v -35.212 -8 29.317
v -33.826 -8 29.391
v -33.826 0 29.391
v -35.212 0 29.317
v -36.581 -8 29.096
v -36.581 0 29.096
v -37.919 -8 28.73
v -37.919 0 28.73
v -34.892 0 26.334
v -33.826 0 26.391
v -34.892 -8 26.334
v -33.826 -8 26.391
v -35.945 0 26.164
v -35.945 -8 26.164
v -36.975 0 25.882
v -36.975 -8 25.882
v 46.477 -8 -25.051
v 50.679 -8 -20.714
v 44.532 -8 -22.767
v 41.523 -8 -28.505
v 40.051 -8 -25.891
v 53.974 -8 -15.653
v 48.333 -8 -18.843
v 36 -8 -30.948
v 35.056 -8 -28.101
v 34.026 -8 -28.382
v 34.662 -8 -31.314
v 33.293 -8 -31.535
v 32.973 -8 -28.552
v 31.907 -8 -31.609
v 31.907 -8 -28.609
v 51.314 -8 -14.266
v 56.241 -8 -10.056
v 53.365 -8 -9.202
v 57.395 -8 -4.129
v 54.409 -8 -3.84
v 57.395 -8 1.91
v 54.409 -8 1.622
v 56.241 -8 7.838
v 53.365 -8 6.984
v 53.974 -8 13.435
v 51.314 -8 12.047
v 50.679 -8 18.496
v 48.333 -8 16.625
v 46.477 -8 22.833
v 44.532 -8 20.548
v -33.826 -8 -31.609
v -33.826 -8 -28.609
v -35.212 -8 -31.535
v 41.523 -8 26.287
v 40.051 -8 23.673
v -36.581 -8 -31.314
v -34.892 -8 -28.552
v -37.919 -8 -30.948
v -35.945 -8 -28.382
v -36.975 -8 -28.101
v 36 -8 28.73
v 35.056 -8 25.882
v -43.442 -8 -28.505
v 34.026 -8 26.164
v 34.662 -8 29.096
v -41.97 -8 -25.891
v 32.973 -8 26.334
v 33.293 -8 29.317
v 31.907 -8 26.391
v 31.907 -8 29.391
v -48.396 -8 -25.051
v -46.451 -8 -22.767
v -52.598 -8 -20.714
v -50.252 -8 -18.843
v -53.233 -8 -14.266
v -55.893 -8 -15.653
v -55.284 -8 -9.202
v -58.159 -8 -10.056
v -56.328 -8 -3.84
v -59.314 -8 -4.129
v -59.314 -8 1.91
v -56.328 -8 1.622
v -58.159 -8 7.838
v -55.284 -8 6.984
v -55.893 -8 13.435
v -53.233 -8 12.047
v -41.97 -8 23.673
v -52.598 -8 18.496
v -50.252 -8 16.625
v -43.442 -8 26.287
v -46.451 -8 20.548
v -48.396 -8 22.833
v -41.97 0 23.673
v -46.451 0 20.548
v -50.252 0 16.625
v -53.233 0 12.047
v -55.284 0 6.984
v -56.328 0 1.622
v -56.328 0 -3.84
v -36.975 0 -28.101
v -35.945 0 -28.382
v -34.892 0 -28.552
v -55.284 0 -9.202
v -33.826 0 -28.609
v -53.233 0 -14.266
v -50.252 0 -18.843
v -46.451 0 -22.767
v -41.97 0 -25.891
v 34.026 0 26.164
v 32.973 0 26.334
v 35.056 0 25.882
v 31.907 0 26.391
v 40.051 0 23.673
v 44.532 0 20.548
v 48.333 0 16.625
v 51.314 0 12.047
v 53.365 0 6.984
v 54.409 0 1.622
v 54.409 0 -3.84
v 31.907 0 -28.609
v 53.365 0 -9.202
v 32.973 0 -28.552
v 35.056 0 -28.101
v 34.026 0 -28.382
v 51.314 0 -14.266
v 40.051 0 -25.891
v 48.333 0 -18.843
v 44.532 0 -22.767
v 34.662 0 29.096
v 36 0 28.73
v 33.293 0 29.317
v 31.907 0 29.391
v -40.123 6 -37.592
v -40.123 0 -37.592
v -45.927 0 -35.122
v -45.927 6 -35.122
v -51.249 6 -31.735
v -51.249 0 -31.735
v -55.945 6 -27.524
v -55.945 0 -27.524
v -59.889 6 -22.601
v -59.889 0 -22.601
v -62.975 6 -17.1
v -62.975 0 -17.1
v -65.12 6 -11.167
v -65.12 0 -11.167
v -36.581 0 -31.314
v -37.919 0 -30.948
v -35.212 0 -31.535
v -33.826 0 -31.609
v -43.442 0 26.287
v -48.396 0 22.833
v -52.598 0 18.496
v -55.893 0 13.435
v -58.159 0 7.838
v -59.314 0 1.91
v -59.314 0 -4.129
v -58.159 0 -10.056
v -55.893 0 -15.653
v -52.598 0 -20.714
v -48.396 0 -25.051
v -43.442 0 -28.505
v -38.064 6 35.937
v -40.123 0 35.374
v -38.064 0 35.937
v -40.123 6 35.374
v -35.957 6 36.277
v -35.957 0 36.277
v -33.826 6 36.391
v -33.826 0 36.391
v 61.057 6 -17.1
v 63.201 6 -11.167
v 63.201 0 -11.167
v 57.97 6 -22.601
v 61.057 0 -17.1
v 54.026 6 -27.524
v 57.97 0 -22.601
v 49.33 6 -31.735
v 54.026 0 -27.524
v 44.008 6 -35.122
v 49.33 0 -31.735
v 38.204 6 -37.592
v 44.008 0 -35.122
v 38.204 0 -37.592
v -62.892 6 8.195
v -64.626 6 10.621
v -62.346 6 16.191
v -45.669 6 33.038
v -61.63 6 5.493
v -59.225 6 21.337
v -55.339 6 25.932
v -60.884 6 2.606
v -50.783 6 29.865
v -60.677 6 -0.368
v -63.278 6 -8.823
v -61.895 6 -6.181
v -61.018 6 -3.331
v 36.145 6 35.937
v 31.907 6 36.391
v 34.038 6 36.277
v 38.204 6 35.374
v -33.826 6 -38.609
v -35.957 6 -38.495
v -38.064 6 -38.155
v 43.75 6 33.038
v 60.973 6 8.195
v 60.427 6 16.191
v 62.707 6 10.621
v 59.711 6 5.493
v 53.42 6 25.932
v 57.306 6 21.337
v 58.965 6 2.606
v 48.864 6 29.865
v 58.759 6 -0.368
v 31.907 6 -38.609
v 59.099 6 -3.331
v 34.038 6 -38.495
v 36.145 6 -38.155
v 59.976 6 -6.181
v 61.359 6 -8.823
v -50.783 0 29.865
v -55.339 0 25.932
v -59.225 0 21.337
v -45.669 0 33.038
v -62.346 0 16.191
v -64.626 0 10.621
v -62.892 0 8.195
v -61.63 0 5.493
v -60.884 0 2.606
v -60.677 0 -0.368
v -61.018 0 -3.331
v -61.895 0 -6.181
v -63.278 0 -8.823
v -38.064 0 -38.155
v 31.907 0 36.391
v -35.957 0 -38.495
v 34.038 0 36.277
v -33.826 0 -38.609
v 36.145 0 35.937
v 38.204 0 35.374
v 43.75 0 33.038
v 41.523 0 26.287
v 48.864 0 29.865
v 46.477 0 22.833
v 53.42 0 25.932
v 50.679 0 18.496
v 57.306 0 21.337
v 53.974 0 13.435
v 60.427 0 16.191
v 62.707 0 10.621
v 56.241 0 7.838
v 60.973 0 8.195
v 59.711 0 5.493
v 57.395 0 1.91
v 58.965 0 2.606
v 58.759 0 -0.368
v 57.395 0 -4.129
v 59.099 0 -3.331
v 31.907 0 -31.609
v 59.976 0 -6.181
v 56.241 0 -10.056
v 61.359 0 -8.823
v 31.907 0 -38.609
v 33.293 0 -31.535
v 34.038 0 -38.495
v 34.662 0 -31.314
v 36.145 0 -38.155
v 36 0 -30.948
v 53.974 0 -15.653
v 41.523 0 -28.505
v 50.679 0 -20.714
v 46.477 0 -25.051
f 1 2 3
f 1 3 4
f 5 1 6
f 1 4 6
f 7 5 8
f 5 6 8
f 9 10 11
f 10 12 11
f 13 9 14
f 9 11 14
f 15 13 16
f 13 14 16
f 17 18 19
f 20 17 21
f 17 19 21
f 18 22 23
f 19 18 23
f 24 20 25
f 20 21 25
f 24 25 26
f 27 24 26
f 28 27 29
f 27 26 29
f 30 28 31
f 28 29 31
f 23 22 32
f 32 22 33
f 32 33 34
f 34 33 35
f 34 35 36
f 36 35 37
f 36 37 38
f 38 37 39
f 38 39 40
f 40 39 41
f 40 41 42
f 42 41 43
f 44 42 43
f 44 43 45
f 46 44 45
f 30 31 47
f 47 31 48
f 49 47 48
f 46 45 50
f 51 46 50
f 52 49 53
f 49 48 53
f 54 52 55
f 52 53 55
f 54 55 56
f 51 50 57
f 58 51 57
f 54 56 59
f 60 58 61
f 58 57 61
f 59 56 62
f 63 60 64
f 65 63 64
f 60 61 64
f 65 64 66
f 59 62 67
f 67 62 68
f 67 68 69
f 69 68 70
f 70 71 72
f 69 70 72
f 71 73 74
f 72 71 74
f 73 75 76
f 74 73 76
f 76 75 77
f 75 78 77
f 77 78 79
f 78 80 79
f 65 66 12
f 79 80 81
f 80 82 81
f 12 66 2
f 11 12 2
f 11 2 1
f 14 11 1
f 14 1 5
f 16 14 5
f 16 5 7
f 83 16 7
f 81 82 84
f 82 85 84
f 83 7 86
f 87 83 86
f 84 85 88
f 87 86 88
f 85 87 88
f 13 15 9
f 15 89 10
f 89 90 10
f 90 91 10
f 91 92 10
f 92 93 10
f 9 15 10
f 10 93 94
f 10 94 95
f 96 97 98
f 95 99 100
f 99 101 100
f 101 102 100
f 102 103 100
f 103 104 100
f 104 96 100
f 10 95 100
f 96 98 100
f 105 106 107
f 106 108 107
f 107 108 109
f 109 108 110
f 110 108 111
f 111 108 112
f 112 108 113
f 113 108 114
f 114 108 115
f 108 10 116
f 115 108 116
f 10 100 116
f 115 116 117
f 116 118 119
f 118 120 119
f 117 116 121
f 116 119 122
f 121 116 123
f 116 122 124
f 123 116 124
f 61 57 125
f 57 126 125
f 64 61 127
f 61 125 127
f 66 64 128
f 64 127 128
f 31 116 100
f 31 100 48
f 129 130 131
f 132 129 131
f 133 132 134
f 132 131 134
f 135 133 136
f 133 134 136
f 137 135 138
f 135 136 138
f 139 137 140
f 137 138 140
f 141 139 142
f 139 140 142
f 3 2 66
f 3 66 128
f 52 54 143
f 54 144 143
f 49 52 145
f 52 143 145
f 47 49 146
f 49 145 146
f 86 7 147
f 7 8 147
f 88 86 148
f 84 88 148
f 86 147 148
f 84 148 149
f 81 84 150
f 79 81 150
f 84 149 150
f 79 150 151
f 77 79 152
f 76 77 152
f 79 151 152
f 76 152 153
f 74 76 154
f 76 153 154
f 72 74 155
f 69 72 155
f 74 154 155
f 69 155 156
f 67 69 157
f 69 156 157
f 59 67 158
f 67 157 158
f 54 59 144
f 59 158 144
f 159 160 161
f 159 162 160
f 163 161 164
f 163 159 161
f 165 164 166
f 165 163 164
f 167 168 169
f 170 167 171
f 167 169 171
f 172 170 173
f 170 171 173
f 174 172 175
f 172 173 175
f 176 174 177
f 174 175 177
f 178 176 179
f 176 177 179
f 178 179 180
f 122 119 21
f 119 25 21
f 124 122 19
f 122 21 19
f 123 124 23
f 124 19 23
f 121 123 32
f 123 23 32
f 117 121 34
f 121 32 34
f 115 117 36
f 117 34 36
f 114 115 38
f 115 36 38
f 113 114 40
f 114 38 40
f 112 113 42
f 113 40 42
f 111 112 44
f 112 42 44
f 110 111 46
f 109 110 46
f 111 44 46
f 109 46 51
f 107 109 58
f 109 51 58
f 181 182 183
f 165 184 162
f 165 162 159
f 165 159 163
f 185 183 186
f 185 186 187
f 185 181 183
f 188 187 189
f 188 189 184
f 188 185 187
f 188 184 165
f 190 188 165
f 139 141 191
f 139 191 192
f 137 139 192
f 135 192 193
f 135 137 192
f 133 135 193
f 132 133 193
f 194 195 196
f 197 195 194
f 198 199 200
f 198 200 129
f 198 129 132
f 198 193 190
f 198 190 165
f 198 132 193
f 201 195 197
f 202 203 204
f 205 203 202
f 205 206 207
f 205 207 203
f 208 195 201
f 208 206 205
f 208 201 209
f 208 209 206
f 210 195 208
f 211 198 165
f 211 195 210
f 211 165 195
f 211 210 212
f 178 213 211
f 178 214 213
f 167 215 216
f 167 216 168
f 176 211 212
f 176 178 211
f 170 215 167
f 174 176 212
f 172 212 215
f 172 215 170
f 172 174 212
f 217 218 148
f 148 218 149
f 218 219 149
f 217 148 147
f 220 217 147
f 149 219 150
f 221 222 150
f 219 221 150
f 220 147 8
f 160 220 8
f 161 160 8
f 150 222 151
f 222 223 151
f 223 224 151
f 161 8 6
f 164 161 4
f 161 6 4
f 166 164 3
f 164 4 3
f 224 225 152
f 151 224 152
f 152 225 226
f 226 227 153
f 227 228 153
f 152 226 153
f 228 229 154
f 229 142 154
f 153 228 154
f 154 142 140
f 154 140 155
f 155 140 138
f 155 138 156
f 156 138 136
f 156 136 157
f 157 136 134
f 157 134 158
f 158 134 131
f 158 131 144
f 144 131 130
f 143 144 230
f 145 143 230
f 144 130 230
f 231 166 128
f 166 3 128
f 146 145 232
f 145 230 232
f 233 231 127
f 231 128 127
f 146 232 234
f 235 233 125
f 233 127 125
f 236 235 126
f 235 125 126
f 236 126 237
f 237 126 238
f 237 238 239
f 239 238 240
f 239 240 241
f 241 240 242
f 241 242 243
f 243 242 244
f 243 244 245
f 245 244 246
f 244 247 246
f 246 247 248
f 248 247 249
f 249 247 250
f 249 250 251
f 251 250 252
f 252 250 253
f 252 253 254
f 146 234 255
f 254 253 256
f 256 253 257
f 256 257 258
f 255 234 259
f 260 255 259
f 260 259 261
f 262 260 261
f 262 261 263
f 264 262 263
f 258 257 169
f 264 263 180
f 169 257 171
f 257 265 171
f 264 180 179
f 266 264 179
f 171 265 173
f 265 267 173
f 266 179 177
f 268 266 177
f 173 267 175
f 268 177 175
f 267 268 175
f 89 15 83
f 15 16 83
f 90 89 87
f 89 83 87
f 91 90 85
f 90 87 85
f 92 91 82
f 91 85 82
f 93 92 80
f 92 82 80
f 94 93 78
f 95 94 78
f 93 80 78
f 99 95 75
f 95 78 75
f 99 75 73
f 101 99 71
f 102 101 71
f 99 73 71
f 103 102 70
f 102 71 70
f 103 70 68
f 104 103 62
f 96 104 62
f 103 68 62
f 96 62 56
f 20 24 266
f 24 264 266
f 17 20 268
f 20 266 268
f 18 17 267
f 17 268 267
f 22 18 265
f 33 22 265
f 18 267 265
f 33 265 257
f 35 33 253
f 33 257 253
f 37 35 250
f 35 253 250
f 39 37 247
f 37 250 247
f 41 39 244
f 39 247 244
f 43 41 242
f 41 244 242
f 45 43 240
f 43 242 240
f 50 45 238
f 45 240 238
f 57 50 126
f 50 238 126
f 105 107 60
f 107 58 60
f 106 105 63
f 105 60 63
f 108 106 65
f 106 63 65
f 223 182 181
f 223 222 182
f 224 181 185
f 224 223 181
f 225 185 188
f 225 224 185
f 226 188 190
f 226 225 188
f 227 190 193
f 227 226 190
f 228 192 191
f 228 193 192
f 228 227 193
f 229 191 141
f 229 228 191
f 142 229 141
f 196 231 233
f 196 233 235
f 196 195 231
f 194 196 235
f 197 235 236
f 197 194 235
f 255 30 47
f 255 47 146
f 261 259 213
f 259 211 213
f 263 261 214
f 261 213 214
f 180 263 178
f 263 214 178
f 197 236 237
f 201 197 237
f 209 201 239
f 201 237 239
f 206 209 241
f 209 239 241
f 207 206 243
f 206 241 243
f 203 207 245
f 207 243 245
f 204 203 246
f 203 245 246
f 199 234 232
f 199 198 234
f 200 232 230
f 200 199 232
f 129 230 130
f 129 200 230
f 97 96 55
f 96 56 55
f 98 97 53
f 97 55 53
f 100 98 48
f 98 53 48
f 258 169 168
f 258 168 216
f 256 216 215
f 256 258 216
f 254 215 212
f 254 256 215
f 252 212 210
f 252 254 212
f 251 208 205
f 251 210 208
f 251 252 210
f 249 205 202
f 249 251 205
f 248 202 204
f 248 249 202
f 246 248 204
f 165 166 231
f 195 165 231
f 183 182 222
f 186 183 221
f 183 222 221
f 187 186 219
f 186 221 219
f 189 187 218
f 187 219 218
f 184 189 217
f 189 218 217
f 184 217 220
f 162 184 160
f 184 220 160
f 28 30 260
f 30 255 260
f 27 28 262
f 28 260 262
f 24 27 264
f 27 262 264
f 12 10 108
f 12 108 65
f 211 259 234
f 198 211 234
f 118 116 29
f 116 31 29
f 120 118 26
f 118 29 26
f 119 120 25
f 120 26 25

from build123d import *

# Parameters (mm, degrees)
BOSS_EXTRUDE1_DEPTH = 6
FILLET1_R           = 20
SKETCH4_W           = 3
SKETCH4_H           = 8
SKETCH6_R           = 16.245672788
CUT_EXTRUDE1_DEPTH  = 10


with BuildPart() as part:
    # Sketch1 → Boss-Extrude1 (new body)
    with BuildSketch(Plane(origin=(0, 0, 0), x_dir=(1, 0, 0), z_dir=(0, 1, 0))):
        with BuildLine():
            Line((34.540516942, 38.609131748), (-36.459483058, 38.609131748))
            ThreePointArc((-36.459483058, 38.609131748), (-66.459483058, 1.109131748), (-36.459483058, -36.390868252))
            Line((-36.459483058, -36.390868252), (34.540516942, -36.390868252))
            ThreePointArc((34.540516942, -36.390868252), (64.540516942, 1.109131748), (34.540516942, 38.609131748))
        make_face()
    extrude(amount=BOSS_EXTRUDE1_DEPTH)

    # Fillet1
    fillet1_edges = [part.edges().sort_by_distance(p)[0] for p in [
        (-36.459483058, 3, -38.609131748),
        (34.540516942, 3, -38.609131748),
        (34.540516942, 3, 36.390868252),
        (-36.459483058, 3, 36.390868252),
    ]]
    fillet(fillet1_edges, radius=FILLET1_R)

    # Sweep1: sweep along a path in Sketch3
    with BuildLine(Plane.XZ) as sweep1_path:
        Line((31.907446823, 29.390868252), (-33.82641294, 29.390868252))
        ThreePointArc((-33.82641294, 29.390868252), (-35.899239553, 29.224550102), (-37.919027907, 28.729851303))
        ThreePointArc((-37.919027907, 28.729851303), (-59.459483058, -1.109131748), (-37.919027907, -30.948114799))
        ThreePointArc((-37.919027907, -30.948114799), (-35.899239553, -31.442813598), (-33.82641294, -31.609131748))
        Line((-33.82641294, -31.609131748), (31.907446823, -31.609131748))
        ThreePointArc((31.907446823, -31.609131748), (33.980273437, -31.442813598), (36.000061791, -30.948114799))
        ThreePointArc((36.000061791, -30.948114799), (57.540516942, -1.109131748), (36.000061791, 28.729851303))
        ThreePointArc((36.000061791, 28.729851303), (33.980273437, 29.224550102), (31.907446823, 29.390868252))
    # Sketch4 → Sweep1 (sweep)
    with BuildSketch(Plane(origin=(31.907446823, 0, -31.609131748), x_dir=(0, 0, -1), z_dir=(1, 0, 0))):
        with Locations((-1.5, -4)):
            Rectangle(SKETCH4_W, SKETCH4_H)
    sweep(path=sweep1_path.line)

    # Sketch6 → Cut-Extrude1 (cut)
    with BuildSketch(Plane(origin=(0, 0, 0), x_dir=(1, 0, 0), z_dir=(0, 1, 0))):
        with Locations((75, 0)):
            Circle(SKETCH6_R)
        with Locations((-76.918966117, 0)):
            Circle(SKETCH6_R)
    extrude(amount=CUT_EXTRUDE1_DEPTH, mode=Mode.SUBTRACT)


solid = part.part
